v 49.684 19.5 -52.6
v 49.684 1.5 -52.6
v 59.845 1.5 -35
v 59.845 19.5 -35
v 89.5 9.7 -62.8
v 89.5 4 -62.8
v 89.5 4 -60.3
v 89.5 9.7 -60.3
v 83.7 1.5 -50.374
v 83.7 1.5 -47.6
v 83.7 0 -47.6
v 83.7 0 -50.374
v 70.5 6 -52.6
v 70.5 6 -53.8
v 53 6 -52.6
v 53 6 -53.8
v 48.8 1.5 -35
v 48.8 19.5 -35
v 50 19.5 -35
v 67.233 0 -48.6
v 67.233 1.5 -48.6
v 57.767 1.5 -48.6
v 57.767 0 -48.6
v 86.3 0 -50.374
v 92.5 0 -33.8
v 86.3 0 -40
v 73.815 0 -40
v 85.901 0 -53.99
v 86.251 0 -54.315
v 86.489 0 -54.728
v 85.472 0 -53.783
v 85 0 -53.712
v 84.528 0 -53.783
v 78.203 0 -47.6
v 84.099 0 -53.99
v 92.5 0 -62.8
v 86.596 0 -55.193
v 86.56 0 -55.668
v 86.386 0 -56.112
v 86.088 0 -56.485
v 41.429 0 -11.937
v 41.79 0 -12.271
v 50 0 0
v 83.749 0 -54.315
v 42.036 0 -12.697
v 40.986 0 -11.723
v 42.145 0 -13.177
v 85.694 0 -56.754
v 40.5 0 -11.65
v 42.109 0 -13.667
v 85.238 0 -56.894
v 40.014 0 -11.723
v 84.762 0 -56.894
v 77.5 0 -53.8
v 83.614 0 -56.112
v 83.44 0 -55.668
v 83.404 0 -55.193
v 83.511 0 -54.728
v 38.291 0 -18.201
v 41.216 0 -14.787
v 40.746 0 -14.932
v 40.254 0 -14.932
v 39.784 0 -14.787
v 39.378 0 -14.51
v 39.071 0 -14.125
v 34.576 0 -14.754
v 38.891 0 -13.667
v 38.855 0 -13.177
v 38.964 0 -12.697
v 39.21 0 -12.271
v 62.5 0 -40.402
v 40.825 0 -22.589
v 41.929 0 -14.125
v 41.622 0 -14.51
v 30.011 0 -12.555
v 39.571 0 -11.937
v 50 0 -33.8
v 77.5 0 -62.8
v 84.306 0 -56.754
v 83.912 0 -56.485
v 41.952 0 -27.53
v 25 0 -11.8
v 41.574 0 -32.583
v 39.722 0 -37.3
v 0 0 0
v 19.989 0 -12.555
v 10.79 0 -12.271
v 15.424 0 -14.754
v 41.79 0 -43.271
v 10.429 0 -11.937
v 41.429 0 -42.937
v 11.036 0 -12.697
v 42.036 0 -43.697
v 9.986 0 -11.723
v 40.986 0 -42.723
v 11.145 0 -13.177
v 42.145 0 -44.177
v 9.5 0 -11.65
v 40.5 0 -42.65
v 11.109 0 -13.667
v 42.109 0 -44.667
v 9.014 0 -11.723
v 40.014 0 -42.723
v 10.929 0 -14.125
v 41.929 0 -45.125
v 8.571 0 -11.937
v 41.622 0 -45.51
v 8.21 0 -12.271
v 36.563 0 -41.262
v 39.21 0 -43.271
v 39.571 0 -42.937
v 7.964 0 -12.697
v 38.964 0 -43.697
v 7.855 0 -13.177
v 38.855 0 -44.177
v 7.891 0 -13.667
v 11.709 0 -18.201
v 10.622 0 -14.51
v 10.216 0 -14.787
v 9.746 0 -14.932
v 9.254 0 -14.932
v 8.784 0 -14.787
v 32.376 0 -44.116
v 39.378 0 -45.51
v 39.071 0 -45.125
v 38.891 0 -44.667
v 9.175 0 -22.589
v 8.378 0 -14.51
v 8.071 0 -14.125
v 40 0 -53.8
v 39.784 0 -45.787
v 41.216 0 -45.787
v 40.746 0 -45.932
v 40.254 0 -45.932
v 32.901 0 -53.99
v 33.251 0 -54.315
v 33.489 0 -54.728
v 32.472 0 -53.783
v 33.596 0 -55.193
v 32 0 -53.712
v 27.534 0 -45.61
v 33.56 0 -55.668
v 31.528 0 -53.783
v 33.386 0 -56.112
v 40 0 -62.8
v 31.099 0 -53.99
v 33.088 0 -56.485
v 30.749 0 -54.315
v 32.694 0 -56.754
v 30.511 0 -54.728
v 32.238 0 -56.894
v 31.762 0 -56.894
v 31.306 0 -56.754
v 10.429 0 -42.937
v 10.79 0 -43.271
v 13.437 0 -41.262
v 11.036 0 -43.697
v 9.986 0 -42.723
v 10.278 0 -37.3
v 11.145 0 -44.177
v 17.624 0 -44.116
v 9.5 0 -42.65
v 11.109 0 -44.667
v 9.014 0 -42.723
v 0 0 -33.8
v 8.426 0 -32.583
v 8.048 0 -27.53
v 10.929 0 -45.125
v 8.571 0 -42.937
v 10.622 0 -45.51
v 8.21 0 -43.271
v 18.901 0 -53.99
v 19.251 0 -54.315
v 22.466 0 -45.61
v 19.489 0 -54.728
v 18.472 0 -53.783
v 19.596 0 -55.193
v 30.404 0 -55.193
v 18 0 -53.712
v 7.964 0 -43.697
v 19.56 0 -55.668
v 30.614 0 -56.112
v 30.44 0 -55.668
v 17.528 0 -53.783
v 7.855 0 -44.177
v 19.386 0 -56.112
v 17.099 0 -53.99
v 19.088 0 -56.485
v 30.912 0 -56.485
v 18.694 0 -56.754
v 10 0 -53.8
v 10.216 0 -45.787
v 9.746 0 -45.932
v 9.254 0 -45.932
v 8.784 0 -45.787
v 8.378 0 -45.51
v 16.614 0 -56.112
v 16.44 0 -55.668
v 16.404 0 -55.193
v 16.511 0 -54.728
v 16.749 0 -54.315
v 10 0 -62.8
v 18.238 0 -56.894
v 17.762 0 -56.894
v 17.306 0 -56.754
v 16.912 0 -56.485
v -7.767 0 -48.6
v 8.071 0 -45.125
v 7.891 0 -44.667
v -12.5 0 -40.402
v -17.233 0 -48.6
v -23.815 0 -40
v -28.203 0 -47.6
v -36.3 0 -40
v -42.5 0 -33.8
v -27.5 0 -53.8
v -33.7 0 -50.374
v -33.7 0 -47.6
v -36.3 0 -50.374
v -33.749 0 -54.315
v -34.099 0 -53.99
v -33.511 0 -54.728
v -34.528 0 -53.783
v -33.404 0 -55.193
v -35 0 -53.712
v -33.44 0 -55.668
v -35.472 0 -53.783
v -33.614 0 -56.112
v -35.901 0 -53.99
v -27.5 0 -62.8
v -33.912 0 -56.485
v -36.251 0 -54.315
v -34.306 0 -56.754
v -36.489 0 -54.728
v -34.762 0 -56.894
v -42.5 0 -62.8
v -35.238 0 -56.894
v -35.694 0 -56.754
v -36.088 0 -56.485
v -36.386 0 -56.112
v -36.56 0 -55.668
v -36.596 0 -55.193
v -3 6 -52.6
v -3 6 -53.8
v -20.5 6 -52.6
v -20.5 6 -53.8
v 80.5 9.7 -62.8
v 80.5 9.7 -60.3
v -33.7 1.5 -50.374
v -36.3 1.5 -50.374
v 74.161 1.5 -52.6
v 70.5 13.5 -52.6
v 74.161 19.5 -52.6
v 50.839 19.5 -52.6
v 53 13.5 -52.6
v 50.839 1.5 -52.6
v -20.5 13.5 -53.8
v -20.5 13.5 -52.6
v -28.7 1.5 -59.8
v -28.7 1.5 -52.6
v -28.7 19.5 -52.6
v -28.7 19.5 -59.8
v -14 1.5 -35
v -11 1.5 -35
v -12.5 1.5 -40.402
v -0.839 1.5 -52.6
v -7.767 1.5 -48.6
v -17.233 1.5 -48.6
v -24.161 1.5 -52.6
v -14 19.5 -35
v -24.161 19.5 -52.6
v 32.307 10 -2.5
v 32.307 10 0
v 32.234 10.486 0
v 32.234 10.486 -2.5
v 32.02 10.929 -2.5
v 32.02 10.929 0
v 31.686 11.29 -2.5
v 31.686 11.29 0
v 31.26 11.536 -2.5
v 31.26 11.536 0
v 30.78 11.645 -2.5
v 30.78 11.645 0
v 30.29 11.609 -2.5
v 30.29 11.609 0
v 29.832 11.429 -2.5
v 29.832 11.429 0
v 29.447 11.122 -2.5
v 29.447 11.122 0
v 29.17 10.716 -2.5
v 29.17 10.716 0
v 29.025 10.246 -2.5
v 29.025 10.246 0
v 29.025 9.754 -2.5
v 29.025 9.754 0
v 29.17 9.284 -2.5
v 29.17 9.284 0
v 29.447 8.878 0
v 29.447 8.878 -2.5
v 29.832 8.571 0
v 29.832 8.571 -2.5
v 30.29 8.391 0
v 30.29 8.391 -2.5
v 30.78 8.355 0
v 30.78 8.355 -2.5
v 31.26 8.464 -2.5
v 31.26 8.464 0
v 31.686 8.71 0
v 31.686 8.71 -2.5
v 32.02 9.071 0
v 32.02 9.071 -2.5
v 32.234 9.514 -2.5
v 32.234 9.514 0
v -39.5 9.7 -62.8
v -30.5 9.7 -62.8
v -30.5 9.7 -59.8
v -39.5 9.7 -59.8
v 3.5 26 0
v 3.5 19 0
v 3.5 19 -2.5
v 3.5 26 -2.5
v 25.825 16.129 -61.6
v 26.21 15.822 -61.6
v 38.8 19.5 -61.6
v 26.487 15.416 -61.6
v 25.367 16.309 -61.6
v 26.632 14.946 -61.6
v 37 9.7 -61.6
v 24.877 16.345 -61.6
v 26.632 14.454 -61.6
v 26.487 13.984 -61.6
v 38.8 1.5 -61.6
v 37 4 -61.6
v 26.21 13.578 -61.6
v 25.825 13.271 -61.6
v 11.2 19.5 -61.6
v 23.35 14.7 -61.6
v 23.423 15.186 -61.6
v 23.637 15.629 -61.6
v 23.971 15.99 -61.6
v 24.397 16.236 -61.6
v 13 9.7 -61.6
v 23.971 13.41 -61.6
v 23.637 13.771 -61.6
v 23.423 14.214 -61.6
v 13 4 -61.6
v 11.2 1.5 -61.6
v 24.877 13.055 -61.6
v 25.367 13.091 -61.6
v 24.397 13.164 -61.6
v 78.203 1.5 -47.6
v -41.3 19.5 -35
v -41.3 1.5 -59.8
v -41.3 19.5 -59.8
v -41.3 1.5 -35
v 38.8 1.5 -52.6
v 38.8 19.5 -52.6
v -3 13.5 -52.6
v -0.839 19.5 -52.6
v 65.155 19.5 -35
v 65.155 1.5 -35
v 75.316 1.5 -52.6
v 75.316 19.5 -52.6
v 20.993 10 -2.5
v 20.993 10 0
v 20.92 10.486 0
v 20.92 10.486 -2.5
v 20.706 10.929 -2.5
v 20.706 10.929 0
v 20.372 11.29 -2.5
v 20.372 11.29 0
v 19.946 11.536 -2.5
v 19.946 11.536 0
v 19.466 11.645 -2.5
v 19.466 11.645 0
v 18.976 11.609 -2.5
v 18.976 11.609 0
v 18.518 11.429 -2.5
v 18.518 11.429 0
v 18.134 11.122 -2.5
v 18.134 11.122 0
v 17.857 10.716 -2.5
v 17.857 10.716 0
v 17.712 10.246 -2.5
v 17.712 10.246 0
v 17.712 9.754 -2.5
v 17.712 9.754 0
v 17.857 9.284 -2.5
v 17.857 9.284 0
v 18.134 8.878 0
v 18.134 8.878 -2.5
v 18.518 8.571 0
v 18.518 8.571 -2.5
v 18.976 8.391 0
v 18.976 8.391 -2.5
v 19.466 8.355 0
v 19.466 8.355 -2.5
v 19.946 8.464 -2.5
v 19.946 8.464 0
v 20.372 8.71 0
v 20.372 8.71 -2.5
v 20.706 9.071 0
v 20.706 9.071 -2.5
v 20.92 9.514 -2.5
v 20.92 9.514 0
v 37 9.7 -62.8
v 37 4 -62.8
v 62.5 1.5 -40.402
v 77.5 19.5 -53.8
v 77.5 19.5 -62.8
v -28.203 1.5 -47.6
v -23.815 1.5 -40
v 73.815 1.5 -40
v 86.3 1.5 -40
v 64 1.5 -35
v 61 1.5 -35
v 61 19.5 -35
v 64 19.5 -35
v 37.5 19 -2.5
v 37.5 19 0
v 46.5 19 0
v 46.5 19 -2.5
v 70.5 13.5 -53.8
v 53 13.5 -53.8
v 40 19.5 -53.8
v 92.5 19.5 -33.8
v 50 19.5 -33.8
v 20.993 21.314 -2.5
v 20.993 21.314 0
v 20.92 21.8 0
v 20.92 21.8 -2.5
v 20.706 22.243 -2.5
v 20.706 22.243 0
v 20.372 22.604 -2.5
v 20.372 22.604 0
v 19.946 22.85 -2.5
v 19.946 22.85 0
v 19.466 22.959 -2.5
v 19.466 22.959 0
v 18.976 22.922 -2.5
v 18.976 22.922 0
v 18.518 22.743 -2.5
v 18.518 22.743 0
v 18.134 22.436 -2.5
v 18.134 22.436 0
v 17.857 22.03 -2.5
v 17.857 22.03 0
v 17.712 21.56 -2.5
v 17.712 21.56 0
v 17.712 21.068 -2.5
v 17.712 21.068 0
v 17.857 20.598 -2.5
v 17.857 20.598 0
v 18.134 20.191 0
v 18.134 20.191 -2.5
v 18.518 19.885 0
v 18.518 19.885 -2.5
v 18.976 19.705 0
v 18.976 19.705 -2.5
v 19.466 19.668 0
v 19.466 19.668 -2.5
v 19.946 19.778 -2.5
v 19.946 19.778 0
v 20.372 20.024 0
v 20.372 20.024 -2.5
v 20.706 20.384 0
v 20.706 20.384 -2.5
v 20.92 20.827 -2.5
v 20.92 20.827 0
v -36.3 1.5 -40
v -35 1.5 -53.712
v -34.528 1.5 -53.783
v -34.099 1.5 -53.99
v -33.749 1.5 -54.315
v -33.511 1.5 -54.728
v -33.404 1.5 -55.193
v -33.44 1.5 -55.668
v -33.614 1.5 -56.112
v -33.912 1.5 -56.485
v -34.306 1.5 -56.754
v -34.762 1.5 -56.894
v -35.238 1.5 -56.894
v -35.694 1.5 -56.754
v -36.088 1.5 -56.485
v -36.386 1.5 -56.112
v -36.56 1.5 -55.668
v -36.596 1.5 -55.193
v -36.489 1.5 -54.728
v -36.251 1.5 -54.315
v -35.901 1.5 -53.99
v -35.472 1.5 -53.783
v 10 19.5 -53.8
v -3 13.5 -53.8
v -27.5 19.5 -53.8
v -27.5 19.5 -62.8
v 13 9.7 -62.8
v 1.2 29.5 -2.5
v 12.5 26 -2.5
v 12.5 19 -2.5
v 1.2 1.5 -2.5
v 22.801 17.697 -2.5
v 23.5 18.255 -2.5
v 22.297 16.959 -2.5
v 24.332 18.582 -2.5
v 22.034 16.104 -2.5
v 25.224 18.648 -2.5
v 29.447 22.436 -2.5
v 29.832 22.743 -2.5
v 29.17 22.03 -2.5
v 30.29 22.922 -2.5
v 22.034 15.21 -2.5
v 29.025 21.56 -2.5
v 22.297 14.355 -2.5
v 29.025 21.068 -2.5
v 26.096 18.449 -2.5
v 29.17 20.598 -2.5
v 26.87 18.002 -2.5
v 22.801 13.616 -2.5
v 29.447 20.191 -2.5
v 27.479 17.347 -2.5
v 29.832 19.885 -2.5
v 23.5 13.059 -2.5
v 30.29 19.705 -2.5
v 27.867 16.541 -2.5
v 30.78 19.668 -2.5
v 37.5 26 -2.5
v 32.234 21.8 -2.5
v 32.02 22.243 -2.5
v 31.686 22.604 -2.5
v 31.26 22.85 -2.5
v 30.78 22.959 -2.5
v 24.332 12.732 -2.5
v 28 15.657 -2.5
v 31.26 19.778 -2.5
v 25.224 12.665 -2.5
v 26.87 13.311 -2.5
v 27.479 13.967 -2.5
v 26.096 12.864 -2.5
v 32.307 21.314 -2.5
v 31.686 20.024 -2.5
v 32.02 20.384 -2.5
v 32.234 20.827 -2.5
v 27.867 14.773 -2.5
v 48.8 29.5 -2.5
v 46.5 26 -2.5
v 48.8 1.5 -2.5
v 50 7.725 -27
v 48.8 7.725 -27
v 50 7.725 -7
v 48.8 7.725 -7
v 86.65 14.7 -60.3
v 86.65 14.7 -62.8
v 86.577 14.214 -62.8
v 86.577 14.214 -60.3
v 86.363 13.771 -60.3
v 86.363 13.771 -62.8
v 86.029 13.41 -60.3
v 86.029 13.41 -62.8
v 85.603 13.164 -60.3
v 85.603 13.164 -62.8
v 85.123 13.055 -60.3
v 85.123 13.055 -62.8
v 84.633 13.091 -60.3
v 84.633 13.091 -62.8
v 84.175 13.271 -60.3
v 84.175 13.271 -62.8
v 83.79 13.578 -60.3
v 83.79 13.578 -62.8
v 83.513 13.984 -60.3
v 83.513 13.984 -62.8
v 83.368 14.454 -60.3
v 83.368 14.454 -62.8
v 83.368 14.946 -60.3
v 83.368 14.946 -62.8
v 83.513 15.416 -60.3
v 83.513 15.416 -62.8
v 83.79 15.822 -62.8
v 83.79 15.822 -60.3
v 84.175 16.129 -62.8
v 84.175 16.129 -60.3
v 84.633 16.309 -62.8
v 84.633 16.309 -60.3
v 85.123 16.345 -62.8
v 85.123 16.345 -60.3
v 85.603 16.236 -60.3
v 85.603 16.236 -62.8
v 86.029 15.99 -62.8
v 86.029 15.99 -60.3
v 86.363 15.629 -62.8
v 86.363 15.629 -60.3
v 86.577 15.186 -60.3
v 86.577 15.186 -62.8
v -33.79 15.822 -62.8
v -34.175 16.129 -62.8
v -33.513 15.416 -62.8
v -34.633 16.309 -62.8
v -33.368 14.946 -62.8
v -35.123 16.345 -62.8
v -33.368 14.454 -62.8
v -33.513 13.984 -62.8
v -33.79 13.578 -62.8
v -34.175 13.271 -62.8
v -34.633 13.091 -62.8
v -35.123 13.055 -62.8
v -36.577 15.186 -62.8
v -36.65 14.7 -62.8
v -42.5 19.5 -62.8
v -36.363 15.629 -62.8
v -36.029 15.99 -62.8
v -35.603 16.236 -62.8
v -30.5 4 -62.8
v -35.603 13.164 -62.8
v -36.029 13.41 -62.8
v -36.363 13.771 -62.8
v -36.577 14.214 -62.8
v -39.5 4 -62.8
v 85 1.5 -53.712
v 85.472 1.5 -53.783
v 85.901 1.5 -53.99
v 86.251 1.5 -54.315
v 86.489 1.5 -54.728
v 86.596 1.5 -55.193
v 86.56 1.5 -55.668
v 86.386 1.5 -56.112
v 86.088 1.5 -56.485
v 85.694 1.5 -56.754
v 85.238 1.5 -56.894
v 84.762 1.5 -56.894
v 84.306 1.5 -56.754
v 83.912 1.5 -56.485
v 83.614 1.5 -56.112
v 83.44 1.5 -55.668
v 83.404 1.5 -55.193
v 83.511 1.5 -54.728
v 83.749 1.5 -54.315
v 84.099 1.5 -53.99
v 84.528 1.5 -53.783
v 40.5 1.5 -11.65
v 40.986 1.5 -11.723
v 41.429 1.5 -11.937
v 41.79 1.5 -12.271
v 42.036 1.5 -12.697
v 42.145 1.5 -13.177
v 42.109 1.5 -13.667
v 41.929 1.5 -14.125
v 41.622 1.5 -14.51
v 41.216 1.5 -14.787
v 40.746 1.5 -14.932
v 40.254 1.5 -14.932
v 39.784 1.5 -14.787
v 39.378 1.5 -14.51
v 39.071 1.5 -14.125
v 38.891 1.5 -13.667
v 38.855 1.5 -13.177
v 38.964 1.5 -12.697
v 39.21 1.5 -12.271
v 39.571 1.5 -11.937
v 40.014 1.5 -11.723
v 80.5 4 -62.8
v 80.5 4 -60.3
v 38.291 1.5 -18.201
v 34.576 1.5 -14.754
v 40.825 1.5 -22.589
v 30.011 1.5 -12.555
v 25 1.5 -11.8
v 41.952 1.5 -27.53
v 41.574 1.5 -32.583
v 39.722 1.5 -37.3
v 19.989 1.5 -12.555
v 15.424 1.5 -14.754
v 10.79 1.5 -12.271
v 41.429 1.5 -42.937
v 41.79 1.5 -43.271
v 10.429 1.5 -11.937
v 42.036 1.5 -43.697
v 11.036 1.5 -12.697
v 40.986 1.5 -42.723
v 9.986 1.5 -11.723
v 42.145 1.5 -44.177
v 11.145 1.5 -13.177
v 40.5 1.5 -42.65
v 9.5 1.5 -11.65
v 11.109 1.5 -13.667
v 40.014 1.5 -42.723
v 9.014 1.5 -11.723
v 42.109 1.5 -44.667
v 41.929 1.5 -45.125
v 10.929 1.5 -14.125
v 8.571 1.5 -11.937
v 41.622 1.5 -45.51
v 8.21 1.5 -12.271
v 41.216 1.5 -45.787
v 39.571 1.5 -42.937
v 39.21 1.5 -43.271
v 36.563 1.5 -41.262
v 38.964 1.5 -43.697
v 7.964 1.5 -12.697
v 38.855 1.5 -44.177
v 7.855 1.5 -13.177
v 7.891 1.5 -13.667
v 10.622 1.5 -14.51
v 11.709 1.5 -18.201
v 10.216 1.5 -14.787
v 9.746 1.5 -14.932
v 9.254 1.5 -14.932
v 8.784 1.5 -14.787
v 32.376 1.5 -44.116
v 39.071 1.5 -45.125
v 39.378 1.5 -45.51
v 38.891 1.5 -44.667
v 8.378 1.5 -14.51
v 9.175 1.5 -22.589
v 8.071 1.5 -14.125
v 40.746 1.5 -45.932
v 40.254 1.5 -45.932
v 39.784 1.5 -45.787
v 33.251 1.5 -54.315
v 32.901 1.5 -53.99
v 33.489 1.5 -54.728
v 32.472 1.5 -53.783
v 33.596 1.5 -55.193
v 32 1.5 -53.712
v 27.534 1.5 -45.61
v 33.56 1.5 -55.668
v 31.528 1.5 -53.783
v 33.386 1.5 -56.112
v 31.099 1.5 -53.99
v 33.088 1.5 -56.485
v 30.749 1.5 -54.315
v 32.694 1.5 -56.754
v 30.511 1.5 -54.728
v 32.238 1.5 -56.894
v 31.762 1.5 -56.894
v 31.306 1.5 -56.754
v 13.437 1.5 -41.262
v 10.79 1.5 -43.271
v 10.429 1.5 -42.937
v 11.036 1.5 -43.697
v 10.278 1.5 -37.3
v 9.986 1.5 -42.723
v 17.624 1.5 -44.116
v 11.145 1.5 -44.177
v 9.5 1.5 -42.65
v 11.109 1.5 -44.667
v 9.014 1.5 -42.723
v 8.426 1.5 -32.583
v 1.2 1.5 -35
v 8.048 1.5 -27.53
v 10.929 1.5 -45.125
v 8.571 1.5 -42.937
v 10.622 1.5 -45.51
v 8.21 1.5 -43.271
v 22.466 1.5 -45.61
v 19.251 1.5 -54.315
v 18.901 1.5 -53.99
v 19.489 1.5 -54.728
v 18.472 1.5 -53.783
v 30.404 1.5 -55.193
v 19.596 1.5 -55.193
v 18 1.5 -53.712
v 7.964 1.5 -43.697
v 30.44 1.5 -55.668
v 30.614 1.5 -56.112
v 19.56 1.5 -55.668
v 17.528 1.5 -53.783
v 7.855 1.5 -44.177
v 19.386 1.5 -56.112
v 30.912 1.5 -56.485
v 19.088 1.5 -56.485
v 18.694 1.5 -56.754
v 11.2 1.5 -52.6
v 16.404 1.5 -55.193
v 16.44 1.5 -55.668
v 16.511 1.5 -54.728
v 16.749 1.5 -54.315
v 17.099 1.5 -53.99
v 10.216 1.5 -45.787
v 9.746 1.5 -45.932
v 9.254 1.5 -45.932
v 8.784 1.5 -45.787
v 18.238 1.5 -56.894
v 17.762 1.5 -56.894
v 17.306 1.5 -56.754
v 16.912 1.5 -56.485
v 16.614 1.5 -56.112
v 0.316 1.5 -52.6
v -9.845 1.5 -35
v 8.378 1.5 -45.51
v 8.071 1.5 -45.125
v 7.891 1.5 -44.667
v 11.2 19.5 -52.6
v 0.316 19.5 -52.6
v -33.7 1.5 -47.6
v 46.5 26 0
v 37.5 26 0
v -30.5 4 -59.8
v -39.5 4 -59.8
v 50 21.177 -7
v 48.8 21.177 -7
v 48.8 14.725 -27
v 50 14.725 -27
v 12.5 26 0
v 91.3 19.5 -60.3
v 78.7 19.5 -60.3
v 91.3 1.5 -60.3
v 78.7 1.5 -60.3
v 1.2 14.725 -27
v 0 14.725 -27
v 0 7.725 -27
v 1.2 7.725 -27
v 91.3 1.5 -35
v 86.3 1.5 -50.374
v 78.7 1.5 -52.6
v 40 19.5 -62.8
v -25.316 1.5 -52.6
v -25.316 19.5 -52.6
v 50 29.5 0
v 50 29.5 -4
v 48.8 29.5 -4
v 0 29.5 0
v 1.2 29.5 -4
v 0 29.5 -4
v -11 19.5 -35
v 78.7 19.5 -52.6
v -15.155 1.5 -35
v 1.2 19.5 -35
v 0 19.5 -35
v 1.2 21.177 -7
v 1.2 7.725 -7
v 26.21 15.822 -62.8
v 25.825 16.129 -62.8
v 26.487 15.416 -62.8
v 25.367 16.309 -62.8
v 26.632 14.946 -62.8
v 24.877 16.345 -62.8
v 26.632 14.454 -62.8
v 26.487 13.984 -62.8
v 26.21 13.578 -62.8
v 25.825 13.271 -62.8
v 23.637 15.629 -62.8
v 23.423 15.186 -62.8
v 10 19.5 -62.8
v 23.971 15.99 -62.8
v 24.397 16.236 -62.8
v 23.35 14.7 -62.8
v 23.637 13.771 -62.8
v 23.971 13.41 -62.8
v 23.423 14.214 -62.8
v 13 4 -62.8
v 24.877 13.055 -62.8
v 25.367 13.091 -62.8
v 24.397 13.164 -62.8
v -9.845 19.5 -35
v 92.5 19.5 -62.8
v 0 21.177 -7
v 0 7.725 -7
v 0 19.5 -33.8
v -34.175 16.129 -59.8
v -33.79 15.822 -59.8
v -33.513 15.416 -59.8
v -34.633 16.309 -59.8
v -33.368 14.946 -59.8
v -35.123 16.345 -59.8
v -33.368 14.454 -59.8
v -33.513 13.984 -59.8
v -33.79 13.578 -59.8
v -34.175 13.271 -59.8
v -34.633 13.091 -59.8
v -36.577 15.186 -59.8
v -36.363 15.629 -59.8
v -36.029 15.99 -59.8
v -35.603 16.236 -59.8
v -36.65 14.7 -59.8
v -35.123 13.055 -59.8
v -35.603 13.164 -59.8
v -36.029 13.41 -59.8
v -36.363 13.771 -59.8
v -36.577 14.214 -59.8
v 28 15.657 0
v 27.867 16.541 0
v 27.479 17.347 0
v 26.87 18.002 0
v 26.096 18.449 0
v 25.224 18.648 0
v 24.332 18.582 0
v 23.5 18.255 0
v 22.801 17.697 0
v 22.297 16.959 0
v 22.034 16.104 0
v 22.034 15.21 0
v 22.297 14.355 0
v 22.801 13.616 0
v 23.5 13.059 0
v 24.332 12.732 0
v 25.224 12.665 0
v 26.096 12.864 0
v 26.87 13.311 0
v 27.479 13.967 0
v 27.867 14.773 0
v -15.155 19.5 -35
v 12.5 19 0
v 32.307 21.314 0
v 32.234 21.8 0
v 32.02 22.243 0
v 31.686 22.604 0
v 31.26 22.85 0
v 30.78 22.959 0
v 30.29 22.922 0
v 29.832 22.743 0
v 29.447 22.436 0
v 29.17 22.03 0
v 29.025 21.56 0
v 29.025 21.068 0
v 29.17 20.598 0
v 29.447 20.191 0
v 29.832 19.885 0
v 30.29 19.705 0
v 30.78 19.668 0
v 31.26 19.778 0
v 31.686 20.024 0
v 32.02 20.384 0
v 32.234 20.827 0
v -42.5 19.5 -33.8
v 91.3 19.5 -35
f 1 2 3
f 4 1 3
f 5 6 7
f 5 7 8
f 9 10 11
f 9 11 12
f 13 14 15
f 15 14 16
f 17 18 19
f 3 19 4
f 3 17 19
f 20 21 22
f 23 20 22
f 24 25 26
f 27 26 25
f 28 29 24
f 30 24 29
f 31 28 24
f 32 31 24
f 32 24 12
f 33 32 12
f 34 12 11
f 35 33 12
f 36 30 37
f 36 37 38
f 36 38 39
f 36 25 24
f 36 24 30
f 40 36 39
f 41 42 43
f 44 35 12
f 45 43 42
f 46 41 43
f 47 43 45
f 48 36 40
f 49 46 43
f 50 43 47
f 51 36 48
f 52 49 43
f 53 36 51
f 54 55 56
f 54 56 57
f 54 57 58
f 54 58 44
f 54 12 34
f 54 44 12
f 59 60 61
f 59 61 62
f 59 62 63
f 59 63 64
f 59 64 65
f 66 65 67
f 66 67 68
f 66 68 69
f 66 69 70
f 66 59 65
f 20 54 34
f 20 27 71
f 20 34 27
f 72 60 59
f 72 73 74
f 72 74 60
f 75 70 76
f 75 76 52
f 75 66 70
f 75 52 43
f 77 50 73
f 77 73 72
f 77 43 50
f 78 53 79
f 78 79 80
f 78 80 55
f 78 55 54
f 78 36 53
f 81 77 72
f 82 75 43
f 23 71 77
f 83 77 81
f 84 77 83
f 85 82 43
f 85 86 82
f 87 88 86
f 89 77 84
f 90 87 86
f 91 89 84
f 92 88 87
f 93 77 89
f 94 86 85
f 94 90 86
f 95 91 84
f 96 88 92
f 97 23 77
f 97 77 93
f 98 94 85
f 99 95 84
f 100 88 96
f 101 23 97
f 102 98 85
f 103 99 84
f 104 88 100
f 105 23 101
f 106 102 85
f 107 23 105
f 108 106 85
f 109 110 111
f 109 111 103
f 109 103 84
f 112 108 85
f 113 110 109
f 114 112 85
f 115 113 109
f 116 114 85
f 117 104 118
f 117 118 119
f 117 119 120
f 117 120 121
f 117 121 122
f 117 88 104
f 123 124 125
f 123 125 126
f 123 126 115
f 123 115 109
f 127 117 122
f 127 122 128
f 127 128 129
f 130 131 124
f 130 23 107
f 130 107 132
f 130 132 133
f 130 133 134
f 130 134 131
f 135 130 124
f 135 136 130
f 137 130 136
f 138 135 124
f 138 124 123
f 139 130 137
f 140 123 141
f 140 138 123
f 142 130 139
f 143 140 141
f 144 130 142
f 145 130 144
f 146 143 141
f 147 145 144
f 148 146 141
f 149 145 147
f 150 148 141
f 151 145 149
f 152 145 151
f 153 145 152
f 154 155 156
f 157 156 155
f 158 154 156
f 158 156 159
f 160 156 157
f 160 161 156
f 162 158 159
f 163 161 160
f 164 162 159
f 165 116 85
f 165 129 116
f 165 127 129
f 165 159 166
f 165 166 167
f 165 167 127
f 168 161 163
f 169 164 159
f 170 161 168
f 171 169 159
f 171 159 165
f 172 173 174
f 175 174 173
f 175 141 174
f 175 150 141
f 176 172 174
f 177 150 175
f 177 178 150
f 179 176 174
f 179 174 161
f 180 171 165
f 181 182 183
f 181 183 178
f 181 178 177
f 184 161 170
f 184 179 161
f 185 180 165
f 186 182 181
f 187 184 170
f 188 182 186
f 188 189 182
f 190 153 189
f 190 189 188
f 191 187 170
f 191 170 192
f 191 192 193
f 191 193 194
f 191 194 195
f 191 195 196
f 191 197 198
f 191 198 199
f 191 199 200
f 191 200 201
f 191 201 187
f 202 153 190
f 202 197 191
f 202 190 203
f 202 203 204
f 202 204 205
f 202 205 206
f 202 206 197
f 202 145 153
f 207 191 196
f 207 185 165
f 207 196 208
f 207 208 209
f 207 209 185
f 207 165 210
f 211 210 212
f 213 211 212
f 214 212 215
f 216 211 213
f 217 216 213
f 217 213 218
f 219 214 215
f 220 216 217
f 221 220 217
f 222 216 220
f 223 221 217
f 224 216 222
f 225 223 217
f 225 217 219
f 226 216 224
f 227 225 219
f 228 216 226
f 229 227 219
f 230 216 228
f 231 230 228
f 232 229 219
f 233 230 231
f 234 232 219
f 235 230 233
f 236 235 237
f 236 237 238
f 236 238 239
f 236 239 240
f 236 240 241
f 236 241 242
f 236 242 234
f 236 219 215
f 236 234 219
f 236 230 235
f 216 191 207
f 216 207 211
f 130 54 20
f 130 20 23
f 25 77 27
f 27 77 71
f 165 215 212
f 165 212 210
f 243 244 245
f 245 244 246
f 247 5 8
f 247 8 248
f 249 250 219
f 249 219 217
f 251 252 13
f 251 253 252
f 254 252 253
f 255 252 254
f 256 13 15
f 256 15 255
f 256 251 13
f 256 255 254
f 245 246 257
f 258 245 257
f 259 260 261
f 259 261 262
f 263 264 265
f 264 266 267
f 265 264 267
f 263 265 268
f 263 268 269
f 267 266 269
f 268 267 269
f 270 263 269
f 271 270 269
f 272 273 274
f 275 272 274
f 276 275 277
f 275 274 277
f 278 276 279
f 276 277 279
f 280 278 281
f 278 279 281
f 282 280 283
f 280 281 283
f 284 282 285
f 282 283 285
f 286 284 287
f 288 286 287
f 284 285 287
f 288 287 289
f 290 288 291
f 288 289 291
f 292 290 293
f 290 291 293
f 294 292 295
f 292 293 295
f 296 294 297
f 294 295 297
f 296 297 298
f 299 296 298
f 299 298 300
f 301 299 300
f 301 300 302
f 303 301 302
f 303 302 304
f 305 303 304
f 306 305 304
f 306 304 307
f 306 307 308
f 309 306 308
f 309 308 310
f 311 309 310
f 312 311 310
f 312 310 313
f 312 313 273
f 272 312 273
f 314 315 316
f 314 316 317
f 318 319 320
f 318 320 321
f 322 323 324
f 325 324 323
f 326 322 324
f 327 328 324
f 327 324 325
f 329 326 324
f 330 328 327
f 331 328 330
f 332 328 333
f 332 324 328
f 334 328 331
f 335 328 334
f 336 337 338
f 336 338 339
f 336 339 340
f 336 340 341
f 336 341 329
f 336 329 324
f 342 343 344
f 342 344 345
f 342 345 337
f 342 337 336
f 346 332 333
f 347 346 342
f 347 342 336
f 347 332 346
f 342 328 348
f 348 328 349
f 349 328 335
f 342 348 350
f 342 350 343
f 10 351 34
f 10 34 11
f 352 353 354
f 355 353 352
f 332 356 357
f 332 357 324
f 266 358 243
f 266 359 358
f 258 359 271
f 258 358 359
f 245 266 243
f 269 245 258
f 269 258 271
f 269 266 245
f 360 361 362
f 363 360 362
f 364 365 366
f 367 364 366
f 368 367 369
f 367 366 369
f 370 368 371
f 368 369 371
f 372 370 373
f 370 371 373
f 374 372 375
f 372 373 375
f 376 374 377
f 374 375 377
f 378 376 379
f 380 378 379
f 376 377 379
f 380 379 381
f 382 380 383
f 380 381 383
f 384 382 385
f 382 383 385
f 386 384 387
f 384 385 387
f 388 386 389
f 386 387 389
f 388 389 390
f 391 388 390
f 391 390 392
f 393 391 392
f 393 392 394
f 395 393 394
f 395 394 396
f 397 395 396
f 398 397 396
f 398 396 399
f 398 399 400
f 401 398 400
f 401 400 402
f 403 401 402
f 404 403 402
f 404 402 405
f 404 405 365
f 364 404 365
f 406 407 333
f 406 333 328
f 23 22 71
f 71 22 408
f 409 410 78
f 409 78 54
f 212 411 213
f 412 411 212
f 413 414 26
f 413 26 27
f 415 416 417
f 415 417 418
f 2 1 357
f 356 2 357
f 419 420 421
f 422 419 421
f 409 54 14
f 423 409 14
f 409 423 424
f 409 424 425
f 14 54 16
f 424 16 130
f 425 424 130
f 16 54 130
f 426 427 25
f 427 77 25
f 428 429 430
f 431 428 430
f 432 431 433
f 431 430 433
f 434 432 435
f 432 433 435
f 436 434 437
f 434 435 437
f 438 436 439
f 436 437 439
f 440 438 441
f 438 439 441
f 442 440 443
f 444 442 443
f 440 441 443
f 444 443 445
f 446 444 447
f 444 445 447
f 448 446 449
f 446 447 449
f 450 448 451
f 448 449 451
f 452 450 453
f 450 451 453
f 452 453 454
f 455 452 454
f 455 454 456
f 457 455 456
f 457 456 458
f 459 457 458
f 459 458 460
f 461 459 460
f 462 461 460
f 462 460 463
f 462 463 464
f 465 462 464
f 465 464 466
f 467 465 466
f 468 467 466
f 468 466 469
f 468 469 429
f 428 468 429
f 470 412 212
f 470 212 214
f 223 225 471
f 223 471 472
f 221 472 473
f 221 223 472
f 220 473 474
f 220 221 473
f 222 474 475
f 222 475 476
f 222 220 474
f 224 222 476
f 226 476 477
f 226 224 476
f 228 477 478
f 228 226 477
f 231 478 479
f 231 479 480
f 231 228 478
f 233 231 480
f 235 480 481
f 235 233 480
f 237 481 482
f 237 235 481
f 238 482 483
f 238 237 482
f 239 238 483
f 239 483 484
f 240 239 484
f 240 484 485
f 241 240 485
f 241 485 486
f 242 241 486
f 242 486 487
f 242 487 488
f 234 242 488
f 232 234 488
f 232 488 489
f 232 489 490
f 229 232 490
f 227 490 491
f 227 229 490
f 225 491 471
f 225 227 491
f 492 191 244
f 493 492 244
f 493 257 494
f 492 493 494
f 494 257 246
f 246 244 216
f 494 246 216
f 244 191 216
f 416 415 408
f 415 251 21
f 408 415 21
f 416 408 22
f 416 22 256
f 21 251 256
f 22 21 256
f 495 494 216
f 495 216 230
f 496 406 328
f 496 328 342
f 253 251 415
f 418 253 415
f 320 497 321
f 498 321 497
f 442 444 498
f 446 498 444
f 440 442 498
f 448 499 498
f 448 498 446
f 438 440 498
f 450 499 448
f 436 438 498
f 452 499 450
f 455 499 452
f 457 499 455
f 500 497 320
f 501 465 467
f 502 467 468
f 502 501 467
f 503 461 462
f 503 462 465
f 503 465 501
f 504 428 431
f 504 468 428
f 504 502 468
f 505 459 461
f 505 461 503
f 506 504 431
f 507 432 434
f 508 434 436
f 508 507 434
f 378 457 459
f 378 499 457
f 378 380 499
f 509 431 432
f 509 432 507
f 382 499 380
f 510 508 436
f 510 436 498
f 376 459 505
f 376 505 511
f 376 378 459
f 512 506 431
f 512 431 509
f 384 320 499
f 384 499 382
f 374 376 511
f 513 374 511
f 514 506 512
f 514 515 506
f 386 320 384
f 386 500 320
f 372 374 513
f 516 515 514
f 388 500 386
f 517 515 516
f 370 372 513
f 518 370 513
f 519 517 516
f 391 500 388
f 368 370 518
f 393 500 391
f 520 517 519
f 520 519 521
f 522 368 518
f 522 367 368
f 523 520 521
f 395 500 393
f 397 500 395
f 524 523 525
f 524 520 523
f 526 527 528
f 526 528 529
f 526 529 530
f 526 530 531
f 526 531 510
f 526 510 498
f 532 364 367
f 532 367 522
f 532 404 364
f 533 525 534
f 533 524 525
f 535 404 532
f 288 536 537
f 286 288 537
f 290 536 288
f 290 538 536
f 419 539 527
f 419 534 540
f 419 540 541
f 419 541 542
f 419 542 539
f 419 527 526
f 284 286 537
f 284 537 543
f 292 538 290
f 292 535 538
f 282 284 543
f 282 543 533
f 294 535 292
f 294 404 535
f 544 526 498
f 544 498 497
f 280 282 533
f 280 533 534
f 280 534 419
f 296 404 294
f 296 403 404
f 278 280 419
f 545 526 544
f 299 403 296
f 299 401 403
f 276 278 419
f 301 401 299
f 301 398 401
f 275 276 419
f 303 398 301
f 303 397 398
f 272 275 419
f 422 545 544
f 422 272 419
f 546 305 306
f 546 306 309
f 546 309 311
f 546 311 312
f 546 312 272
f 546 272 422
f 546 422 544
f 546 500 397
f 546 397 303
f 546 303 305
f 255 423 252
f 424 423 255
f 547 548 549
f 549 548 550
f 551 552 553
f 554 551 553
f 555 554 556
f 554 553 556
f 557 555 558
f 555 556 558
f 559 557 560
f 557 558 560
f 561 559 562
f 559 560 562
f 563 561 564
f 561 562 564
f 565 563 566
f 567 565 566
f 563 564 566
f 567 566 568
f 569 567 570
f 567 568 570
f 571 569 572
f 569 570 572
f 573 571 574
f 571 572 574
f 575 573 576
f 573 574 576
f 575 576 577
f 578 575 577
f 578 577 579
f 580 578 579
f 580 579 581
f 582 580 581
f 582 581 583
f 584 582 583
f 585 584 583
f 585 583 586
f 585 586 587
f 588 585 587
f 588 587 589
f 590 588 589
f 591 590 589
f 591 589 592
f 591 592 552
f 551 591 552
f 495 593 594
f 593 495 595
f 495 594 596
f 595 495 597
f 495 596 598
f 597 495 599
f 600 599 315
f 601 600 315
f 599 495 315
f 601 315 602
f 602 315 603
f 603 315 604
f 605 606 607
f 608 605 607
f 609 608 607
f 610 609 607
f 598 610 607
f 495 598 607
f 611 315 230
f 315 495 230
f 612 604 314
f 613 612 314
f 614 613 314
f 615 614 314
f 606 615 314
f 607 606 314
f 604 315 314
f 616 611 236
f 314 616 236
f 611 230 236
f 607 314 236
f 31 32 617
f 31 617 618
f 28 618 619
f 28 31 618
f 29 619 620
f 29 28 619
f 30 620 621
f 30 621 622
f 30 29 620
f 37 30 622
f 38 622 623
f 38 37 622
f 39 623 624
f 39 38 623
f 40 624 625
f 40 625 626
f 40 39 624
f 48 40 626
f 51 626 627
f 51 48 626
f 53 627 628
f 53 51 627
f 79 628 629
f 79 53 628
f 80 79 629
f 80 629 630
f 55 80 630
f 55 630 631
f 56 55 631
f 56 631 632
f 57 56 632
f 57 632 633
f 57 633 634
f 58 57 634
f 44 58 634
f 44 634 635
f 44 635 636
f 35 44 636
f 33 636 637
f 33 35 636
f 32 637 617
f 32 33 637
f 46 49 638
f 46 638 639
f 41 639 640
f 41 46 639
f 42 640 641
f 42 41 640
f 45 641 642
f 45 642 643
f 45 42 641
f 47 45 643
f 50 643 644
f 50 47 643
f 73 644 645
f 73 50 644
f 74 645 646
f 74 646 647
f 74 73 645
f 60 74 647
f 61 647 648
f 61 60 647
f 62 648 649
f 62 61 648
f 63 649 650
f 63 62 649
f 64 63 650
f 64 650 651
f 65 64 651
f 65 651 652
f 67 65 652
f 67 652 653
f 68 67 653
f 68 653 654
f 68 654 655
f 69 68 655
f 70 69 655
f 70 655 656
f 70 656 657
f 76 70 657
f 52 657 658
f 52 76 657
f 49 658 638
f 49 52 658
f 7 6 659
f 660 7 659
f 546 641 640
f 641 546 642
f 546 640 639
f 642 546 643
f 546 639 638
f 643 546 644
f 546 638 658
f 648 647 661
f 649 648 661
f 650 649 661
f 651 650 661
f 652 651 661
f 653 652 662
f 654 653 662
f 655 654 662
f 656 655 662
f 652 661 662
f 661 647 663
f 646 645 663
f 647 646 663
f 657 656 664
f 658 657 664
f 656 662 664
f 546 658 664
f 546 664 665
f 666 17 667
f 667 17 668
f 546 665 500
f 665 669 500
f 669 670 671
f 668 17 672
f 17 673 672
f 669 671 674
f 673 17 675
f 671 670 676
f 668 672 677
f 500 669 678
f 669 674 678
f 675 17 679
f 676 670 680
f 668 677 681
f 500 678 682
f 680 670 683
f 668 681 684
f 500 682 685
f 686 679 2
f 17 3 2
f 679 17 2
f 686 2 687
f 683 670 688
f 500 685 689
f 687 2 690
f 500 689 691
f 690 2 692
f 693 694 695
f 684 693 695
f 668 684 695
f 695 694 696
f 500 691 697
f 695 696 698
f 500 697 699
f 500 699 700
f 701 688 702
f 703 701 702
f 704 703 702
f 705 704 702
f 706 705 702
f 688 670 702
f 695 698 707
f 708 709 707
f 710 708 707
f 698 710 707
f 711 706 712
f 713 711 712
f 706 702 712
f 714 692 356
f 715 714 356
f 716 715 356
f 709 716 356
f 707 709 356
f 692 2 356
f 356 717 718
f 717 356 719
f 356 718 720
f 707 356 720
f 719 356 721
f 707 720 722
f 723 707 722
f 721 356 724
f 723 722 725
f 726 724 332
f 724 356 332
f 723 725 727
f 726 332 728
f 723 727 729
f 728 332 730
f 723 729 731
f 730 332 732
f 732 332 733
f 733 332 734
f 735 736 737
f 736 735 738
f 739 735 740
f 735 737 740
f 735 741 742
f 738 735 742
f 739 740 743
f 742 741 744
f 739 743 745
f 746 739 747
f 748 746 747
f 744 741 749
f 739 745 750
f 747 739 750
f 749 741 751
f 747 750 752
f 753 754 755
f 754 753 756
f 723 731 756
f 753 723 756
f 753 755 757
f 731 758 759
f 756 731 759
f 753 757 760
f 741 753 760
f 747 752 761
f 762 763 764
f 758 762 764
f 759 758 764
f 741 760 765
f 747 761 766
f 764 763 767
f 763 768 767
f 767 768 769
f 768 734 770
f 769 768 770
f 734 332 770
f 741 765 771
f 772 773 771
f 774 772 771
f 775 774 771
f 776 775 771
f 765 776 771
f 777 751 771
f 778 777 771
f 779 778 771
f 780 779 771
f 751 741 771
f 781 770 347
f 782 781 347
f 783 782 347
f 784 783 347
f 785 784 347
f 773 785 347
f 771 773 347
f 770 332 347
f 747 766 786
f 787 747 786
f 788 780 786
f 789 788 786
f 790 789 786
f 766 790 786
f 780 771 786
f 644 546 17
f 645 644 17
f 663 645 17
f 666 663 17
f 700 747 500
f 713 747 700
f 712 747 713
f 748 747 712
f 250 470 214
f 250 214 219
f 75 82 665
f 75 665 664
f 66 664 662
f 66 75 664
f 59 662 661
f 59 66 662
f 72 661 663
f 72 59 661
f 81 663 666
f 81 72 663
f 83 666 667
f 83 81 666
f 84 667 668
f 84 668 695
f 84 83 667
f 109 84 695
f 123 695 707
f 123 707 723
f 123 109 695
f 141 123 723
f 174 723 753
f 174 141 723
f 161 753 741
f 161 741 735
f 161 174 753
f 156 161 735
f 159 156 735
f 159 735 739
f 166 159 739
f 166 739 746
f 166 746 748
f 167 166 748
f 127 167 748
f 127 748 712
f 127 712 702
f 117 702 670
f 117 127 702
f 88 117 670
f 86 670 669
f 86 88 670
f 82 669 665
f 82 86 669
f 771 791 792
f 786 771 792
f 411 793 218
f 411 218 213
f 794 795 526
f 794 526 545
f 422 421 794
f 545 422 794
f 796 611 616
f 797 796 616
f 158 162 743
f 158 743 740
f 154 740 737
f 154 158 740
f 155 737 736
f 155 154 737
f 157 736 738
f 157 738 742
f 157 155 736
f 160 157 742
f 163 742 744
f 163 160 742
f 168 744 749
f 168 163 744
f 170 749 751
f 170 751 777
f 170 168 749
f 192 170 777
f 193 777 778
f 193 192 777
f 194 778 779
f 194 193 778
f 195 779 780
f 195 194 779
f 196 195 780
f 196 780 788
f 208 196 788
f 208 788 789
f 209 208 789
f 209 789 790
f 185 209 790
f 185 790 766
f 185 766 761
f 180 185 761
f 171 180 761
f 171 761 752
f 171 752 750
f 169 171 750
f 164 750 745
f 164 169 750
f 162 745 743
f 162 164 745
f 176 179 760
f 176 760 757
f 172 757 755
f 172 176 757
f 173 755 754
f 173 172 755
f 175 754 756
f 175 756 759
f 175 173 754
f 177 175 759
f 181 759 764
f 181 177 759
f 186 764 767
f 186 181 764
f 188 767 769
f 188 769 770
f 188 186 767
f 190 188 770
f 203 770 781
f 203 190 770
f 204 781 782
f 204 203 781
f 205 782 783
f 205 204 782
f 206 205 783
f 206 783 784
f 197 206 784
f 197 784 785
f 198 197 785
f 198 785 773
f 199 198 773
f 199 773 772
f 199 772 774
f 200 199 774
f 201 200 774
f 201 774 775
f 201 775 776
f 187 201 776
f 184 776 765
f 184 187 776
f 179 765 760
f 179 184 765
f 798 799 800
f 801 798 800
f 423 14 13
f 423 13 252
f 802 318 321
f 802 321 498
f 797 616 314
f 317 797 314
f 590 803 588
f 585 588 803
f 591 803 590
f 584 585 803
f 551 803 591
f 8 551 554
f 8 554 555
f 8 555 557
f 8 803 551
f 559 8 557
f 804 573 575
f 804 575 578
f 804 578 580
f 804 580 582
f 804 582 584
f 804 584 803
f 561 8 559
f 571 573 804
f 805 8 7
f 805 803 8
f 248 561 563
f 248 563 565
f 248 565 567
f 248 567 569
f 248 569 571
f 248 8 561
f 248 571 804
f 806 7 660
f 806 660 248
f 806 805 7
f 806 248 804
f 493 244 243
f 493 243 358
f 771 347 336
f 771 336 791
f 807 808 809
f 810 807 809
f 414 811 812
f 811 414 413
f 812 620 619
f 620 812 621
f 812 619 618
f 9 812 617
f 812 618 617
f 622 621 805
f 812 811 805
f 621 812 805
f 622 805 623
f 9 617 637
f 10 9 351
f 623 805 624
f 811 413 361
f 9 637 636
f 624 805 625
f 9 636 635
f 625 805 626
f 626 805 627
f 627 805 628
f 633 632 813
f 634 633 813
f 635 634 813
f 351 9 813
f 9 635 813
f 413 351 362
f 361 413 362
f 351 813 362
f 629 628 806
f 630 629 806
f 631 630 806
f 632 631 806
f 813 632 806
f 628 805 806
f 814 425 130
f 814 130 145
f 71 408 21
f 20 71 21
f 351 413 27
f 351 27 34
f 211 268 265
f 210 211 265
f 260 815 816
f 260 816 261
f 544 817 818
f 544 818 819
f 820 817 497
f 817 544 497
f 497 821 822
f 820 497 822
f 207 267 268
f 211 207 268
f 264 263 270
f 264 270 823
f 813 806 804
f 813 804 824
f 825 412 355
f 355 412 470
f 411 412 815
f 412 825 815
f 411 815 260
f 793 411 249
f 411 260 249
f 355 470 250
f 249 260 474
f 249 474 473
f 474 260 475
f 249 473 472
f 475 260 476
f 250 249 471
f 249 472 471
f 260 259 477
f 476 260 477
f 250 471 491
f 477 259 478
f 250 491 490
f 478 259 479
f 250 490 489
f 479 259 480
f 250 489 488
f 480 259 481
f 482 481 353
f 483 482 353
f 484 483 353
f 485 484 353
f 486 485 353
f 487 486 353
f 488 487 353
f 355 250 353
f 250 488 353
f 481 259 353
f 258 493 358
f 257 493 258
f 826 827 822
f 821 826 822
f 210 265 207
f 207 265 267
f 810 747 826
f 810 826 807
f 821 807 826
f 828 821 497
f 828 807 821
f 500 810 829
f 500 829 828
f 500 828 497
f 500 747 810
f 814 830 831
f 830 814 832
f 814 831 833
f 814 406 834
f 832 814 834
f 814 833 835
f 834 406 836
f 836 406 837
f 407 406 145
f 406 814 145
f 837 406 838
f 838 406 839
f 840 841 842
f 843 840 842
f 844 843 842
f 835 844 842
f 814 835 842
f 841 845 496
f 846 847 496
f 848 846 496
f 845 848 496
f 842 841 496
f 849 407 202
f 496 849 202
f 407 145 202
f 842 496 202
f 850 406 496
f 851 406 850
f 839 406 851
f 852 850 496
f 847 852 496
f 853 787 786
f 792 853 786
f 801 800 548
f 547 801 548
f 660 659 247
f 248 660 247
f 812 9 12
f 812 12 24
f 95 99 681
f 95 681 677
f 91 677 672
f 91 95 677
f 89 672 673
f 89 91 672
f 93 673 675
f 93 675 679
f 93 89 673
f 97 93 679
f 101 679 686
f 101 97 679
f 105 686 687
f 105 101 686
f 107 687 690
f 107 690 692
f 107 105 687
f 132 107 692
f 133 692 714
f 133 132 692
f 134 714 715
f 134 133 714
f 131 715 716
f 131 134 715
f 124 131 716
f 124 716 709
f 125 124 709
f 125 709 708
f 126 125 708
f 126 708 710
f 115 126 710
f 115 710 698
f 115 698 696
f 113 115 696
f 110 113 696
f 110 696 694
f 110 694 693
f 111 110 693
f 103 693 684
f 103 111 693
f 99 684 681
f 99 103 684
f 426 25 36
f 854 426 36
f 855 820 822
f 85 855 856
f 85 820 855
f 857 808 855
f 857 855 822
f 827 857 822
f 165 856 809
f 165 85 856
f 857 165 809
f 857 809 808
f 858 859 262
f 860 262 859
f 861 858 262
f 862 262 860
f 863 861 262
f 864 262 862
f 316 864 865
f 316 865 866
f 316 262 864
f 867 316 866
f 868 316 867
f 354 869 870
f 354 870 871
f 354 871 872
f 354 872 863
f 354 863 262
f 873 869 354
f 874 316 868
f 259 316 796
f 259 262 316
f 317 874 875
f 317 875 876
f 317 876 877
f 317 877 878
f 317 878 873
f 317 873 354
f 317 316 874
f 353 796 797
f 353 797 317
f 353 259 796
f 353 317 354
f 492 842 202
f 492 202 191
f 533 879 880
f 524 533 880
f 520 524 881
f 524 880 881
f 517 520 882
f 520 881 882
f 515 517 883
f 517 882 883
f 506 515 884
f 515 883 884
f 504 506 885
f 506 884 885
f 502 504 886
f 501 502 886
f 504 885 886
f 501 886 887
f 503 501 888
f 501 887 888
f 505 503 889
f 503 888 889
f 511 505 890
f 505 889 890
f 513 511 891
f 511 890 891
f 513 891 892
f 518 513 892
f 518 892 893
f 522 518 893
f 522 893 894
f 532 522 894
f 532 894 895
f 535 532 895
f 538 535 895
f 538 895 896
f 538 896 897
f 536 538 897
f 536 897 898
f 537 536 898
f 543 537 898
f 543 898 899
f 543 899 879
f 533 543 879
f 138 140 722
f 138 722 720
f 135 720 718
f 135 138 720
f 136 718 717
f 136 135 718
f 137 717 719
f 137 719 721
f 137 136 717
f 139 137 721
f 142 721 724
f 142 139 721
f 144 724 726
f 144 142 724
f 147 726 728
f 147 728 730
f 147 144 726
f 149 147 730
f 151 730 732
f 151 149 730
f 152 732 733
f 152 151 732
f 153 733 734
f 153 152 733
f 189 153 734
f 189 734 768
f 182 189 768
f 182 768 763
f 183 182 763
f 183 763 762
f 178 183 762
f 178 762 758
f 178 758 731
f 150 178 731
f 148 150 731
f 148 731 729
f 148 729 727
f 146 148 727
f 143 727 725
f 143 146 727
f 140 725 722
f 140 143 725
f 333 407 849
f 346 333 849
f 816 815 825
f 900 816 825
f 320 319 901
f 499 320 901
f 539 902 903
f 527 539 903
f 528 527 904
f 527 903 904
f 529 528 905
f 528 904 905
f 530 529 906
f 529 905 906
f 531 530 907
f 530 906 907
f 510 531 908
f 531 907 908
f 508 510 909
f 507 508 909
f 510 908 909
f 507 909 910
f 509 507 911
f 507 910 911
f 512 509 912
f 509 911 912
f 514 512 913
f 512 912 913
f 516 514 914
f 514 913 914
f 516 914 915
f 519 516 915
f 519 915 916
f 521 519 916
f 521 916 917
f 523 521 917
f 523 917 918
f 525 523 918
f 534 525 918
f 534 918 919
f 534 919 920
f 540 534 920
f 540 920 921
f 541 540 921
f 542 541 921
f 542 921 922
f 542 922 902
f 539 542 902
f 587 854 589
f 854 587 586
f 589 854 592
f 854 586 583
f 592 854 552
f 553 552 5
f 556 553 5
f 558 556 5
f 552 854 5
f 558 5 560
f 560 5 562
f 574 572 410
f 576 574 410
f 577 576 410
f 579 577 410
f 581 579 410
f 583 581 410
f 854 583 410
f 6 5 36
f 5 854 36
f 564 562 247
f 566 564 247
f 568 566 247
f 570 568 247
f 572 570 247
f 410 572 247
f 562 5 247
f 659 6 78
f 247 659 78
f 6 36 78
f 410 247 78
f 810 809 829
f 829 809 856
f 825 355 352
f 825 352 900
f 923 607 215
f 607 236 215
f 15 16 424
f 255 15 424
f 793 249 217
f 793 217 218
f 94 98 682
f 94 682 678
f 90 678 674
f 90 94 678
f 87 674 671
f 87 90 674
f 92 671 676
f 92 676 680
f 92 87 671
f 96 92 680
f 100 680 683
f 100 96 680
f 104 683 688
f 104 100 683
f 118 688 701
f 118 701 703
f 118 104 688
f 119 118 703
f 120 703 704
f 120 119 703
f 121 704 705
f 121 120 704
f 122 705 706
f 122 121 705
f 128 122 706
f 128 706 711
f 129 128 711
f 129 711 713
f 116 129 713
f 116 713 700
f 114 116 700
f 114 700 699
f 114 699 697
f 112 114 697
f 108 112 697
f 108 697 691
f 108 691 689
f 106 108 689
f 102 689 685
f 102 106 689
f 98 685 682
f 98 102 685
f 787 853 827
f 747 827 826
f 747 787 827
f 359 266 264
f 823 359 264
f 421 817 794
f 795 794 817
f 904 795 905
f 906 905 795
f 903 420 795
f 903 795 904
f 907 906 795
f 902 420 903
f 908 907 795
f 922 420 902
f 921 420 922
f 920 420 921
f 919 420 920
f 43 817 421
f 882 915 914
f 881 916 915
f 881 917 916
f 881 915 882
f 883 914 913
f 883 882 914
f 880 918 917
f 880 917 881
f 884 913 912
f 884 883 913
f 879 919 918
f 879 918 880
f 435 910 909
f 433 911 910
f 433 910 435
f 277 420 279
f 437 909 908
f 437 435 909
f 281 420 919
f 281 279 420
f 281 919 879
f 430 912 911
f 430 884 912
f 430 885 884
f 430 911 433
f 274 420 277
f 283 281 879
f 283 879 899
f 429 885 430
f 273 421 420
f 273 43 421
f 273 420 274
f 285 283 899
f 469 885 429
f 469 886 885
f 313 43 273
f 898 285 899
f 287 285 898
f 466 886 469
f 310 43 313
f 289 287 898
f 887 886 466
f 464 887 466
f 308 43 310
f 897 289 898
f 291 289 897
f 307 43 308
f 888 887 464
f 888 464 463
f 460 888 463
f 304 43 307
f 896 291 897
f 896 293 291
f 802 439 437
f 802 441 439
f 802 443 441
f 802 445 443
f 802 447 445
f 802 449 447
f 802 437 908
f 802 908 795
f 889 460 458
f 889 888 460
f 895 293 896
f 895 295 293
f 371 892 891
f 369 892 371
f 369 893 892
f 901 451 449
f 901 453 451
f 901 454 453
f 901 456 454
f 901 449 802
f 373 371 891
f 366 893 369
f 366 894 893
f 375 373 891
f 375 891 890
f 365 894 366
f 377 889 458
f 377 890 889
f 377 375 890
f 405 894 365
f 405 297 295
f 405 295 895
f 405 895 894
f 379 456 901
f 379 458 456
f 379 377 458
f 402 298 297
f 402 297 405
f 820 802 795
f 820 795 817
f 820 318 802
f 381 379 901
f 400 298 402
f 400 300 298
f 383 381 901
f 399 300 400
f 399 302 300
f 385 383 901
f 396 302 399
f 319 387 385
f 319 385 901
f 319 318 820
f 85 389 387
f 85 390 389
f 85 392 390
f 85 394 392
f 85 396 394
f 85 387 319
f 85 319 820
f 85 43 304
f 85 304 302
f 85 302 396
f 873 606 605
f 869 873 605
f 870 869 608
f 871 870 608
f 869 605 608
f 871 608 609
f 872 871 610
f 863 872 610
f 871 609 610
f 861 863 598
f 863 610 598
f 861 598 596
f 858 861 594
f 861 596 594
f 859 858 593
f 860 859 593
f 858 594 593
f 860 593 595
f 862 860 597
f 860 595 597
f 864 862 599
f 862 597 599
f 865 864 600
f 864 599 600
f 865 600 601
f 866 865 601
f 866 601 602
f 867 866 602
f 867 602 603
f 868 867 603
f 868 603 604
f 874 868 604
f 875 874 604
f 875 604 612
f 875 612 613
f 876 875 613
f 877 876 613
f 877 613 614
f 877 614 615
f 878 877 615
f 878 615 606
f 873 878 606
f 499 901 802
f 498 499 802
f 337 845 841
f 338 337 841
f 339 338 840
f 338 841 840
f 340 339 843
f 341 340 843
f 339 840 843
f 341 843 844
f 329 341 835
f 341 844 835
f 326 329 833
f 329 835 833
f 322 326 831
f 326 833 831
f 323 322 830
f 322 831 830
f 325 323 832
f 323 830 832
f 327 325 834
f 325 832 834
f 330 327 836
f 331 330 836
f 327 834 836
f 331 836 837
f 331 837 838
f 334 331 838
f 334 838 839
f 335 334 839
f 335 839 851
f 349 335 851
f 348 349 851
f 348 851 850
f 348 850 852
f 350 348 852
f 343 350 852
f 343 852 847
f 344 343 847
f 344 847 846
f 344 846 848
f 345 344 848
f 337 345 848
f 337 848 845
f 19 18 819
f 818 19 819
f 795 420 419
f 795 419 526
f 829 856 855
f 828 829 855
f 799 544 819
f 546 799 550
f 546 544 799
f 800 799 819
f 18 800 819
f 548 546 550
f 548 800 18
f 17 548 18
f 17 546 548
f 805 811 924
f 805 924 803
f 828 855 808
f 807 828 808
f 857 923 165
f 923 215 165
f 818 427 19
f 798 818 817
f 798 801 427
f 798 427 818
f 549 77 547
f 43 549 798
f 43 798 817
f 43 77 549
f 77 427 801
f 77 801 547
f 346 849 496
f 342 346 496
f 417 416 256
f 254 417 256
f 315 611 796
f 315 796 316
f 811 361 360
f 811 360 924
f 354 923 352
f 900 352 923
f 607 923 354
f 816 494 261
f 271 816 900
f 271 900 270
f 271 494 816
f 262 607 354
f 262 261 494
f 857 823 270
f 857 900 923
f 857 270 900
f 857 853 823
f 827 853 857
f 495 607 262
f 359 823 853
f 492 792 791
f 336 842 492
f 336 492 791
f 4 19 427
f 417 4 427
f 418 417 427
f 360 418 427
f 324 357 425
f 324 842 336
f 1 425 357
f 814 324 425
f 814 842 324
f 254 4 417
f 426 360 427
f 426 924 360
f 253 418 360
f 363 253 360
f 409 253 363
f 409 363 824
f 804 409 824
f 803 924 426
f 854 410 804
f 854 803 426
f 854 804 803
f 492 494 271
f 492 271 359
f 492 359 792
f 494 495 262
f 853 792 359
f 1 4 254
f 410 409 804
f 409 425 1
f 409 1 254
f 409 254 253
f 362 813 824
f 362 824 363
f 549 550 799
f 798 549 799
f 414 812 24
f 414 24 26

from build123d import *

# Parameters (mm, degrees)
SKETCH_2_R           = 1.6
SKETCH_2_R_2         = 17
SKETCH_2_R_3         = 1.65
EXTRUDE_2_DEPTH      = 1.5
EXTRUDE_3_DEPTH      = 18
EXTRUDE_4_DEPTH      = 10
CUT_EXTRUDE_5_DEPTH  = 116.63018637
SKETCH_10_R          = 3
SKETCH_10_R_2        = 1.65
SKETCH_10_W          = 9
SKETCH_10_H          = 7
CUT_EXTRUDE_4_DEPTH  = 5
EXTRUDE_5_DEPTH      = 18
SKETCH_14_R          = 1.65
CUT_EXTRUDE_6_DEPTH  = 10
CUT_EXTRUDE_7_DEPTH  = 116.63018637
SKETCH_18_W          = 9
SKETCH_18_H          = 5.7
SKETCH_18_W_2        = 24
CUT_EXTRUDE_8_DEPTH  = 10
CUT_EXTRUDE_9_DEPTH  = 10
SKETCH_21_W          = 17.5
SKETCH_21_H          = 7.5
CUT_EXTRUDE_10_DEPTH = 1.2


with BuildPart() as part:
    # 草图2 → 凸台-拉伸2 (new body)
    with BuildSketch(Plane(origin=(0, 0, 0), x_dir=(1, 0, 0), z_dir=(0, 1, 0))):
        Polygon((-42.5, 33.8), (-42.5, 62.8), (-27.5, 62.8), (-27.5, 53.8), (10, 53.8), (10, 62.8), (40, 62.8), (40, 53.8), (77.5, 53.8), (77.5, 62.8), (92.5, 62.8), (92.5, 33.8), (50, 33.8), (50, 0), (0, 0), (0, 33.8), align=None)
        with Locations(Location((-35, 55.312210178, 0), (0, 0, 270))):
            Circle(SKETCH_2_R, mode=Mode.SUBTRACT)
        with Locations(Location((85, 55.312210178, 0), (0, 0, 270))):
            Circle(SKETCH_2_R, mode=Mode.SUBTRACT)
        with Locations(Location((18, 55.312210178, 0), (0, 0, 270))):
            Circle(SKETCH_2_R, mode=Mode.SUBTRACT)
        with Locations(Location((32, 55.312210178, 0), (0, 0, 270))):
            Circle(SKETCH_2_R, mode=Mode.SUBTRACT)
        with Locations(Location((25, 28.8, 0), (0, 0, 270))):
            Circle(SKETCH_2_R_2, mode=Mode.SUBTRACT)
        with Locations(Location((40.5, 44.3, 0), (0, 0, 270))):
            Circle(SKETCH_2_R_3, mode=Mode.SUBTRACT)
        with Locations(Location((40.5, 13.3, 0), (0, 0, 270))):
            Circle(SKETCH_2_R_3, mode=Mode.SUBTRACT)
        with Locations(Location((9.5, 13.3, 0), (0, 0, 270))):
            Circle(SKETCH_2_R_3, mode=Mode.SUBTRACT)
        with Locations(Location((9.5, 44.3, 0), (0, 0, 270))):
            Circle(SKETCH_2_R_3, mode=Mode.SUBTRACT)
    extrude(amount=EXTRUDE_2_DEPTH)

    # 草图6 → 凸台-拉伸3 (add)
    with BuildSketch(Plane(origin=(0, 1.5, 0), x_dir=(1, 0, 0), z_dir=(0, 1, 0))):
        Polygon((10, 53.8), (-27.5, 53.8), (-27.5, 62.8), (-42.5, 62.8), (-42.5, 33.8), (0, 33.8), (0, 0), (50, 0), (50, 33.8), (92.5, 33.8), (92.5, 62.8), (77.5, 62.8), (77.5, 53.8), (40, 53.8), (40, 62.8), (10, 62.8), align=None)
        Polygon((11.2, 52.6), (-28.7, 52.6), (-28.7, 59.8), (-41.3, 59.8), (-41.3, 35), (1.2, 35), (1.2, 2.5), (48.8, 2.5), (48.8, 35), (91.3, 35), (91.3, 60.3), (78.7, 60.3), (78.7, 52.6), (38.8, 52.6), (38.8, 61.6), (11.2, 61.6), align=None, mode=Mode.SUBTRACT)
    extrude(amount=EXTRUDE_3_DEPTH)

    # 草图11 → 凸台-拉伸4 (add)
    with BuildSketch(Plane(origin=(0, 19.5, 0), x_dir=(1, 0, 0), z_dir=(0, 1, 0))):
        Polygon((1.2, 35), (1.2, 2.5), (48.8, 2.5), (48.8, 35), (50, 35), (50, 0), (0, 0), (0, 35), align=None)
    extrude(amount=EXTRUDE_4_DEPTH)

    # 草图12 → 切除-拉伸5 (cut, through all)
    with BuildSketch(Plane.ZY):
        Polygon((-35, 19.5), (-4, 29.5), (-35, 29.5), align=None)
    extrude(amount=-CUT_EXTRUDE_5_DEPTH, mode=Mode.SUBTRACT)

    # 草图10 → 切除-拉伸4 (cut)
    with BuildSketch(Plane.XY):
        with Locations((25, 15.656854249)):
            Circle(SKETCH_10_R)
        with Locations((30.656854249, 21.313708499)):
            Circle(SKETCH_10_R_2)
        with Locations((30.656854249, 10)):
            Circle(SKETCH_10_R_2)
        with Locations((19.343145751, 10)):
            Circle(SKETCH_10_R_2)
        with Locations((19.343145751, 21.313708499)):
            Circle(SKETCH_10_R_2)
        with Locations((8, 22.5)):
            Rectangle(SKETCH_10_W, SKETCH_10_H)
        with Locations((42, 22.5)):
            Rectangle(SKETCH_10_W, SKETCH_10_H)
    extrude(amount=-CUT_EXTRUDE_4_DEPTH, mode=Mode.SUBTRACT)

    # 草图13 → 凸台-拉伸5 (add)
    with BuildSketch(Plane(origin=(0, 1.5, 0), x_dir=(1, 0, 0), z_dir=(0, 1, 0))):
        Polygon((0.316065276, 52.6), (-0.838635262, 52.6), (-11, 35), (-9.845299462, 35), align=None)
        Polygon((-15.154700538, 35), (-14, 35), (-24.161364738, 52.6), (-25.316065276, 52.6), align=None)
        Polygon((59.845299462, 35), (61, 35), (50.838635262, 52.6), (49.683934724, 52.6), align=None)
        Polygon((75.316065276, 52.6), (74.161364738, 52.6), (64, 35), (65.154700538, 35), align=None)
    extrude(amount=EXTRUDE_5_DEPTH)

    # 草图14 → 切除-拉伸6 (cut)
    with BuildSketch(Plane(origin=(0, 0, -62.8), x_dir=(-1, 0, 0), z_dir=(0, 0, -1))):
        with Locations((35, 14.7)):
            Circle(SKETCH_14_R)
        with Locations(Location((-85, 14.7, 0), (0, 0, 180))):
            Circle(SKETCH_14_R)
        with Locations((-25, 14.7)):
            Circle(SKETCH_14_R)
    extrude(amount=-CUT_EXTRUDE_6_DEPTH, mode=Mode.SUBTRACT)

    # 草图17 → 切除-拉伸7 (cut, through all)
    with BuildSketch(Plane.ZY):
        Polygon((-7, 21.177065656), (-27, 14.725452753), (-27, 7.725452753), (-7, 7.725452753), align=None)
    extrude(amount=-CUT_EXTRUDE_7_DEPTH, mode=Mode.SUBTRACT)

    # 草图18 → 切除-拉伸8 (cut)
    with BuildSketch(Plane(origin=(0, 0, -62.8), x_dir=(-1, 0, 0), z_dir=(0, 0, -1))):
        with Locations((-85, 6.85)):
            Rectangle(SKETCH_18_W, SKETCH_18_H)
        with Locations((-25, 6.85)):
            Rectangle(SKETCH_18_W_2, SKETCH_18_H)
        with Locations((35, 6.85)):
            Rectangle(SKETCH_18_W, SKETCH_18_H)
    extrude(amount=-CUT_EXTRUDE_8_DEPTH, mode=Mode.SUBTRACT)

    # 草图20 → 切除-拉伸9 (cut)
    with BuildSketch(Plane(origin=(0, 1.5, 0), x_dir=(1, 0, 0), z_dir=(0, 1, 0))):
        Polygon((-12.5, 40.401923789), (-7.766838493, 48.6), (-17.233161507, 48.6), align=None)
        Polygon((62.5, 40.401923789), (67.233161507, 48.6), (57.766838493, 48.6), align=None)
        Polygon((-36.3, 50.373953839), (-33.7, 50.373953839), (-33.7, 47.6), (-28.202816622, 47.6), (-23.814954576, 40), (-36.3, 40), align=None)
        Polygon((86.3, 40), (73.814954576, 40), (78.202816622, 47.6), (83.7, 47.6), (83.7, 50.373953839), (86.3, 50.373953839), align=None)
    extrude(amount=-CUT_EXTRUDE_9_DEPTH, mode=Mode.SUBTRACT)

    # 草图21 → 切除-拉伸10 (cut)
    with BuildSketch(Plane(origin=(0, 0, -53.8), x_dir=(-1, 0, 0), z_dir=(0, 0, -1))):
        with Locations((11.75, 9.75)):
            Rectangle(SKETCH_21_W, SKETCH_21_H)
        with Locations((-61.75, 9.75)):
            Rectangle(SKETCH_21_W, SKETCH_21_H)
    extrude(amount=-CUT_EXTRUDE_10_DEPTH, mode=Mode.SUBTRACT)


solid = part.part
